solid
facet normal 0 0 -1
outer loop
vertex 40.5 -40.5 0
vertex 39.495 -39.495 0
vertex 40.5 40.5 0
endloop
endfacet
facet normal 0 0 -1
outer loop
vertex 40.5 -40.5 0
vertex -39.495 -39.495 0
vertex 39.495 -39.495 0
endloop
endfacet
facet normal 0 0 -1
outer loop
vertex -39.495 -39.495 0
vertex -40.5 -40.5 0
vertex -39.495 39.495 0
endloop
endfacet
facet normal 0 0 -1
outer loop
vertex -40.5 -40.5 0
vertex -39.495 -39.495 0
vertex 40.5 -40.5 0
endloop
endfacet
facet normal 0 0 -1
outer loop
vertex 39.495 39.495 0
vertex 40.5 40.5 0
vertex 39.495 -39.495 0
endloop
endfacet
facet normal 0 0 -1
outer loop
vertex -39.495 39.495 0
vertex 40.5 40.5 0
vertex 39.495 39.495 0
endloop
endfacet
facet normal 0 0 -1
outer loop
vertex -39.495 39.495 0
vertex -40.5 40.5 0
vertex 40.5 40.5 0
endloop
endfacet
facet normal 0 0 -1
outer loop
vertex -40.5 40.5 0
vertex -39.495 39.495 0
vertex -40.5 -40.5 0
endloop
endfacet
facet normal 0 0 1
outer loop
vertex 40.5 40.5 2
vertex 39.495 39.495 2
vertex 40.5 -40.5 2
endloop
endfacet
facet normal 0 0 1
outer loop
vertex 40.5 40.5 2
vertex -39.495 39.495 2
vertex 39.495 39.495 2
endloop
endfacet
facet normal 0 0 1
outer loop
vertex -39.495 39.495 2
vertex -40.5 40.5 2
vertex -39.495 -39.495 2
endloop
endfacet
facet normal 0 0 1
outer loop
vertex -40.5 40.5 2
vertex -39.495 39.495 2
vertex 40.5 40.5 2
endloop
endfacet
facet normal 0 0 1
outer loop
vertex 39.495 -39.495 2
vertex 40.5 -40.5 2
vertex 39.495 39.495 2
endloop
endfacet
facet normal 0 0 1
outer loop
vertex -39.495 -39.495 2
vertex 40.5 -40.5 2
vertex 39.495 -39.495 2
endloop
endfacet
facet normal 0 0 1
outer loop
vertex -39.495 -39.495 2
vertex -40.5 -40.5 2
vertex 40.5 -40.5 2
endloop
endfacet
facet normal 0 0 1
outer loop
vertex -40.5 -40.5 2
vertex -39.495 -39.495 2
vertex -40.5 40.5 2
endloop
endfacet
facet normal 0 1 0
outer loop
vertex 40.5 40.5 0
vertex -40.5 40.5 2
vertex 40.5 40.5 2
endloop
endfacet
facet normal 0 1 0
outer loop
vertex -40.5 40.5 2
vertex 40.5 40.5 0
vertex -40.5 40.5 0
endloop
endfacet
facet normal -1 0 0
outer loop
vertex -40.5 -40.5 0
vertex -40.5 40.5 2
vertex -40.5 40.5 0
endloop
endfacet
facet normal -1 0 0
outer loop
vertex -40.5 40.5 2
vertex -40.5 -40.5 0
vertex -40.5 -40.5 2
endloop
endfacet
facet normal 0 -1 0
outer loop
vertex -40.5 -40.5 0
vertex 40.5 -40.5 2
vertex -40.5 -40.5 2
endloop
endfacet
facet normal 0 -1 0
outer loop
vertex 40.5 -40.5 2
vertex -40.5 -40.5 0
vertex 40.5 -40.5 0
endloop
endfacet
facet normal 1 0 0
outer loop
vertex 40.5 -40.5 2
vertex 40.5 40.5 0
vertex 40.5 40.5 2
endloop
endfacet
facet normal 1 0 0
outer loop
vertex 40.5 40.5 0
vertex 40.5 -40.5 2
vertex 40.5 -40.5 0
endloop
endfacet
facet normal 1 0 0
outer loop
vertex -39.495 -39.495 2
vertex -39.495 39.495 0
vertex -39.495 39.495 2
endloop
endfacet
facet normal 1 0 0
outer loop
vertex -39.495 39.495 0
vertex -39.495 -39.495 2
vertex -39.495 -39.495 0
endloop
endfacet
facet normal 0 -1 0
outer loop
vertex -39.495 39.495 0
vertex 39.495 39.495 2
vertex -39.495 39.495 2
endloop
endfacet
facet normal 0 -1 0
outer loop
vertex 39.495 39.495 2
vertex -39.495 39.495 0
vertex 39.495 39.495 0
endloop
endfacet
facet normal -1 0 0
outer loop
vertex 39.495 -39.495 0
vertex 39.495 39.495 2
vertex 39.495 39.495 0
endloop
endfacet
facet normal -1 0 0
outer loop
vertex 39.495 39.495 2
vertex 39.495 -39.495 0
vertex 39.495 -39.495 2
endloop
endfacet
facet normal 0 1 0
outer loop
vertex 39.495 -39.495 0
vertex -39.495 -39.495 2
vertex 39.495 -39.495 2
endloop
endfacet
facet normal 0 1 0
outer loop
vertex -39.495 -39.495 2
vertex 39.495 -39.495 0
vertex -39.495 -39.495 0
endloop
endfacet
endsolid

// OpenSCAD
// [FL_INDEX: keywords="openscad, 3d_parametric, Customizable_Lithophane__parametrized_length_and_thickness, csg_solid" | COT="Parametric OpenSCAD design from 3DCodeverse"]
// Title: Customizable Lithophane (parametrized length and thickness)

/* 
 * Based on Customizable Lithopane http://www.thingiverse.com/thing:78719
 * 
 * Switched to customizer's higher resolution image input (150 x 150 pixels)
 * Fully parametrized dimensions of lithopane based on thickness and size
 *
 */

// preview[view:south, tilt:top]

/* [Image] */

// Load a square image, simple photos work best. Will be scaled to 150x150 pixels. Make sure to click the Invert Colors checkbox!
image_file = "image5.dat"; // [image_surface:150x150]

/* [Adjustments] */

// Overall thickness/height of lithophane
height = 2;
// Overall length/width of lithophane in mm
size = 81;

//Layer you will be slicing at
layer_height = 0.01;

//Minimum height for bottom layer in mm (recommended at least 0.2)
bottom_padding = 0.4;

// lithophane border in mm
lithophane_border = 2;

/* [Hidden] */
resolution=150;
s=0.01;

difference(){
 union() {
  difference() {
    translate([0, 0, bottom_padding]) scale([(size-lithophane_border+1)/resolution,(size-lithophane_border+1)/resolution,height-bottom_padding]) surface(file=image_file, center=true, convexity=5);

  } // d
 
  linear_extrude(height=height){
    difference(){
      square([size, size], center=true);
      square([size-lithophane_border-s, size-lithophane_border-s], center=true);
    } // d
  } // le
} // u

translate([0,0,-(height)]) linear_extrude(height=height) square([size+s, size+s], center=true);

} //d
